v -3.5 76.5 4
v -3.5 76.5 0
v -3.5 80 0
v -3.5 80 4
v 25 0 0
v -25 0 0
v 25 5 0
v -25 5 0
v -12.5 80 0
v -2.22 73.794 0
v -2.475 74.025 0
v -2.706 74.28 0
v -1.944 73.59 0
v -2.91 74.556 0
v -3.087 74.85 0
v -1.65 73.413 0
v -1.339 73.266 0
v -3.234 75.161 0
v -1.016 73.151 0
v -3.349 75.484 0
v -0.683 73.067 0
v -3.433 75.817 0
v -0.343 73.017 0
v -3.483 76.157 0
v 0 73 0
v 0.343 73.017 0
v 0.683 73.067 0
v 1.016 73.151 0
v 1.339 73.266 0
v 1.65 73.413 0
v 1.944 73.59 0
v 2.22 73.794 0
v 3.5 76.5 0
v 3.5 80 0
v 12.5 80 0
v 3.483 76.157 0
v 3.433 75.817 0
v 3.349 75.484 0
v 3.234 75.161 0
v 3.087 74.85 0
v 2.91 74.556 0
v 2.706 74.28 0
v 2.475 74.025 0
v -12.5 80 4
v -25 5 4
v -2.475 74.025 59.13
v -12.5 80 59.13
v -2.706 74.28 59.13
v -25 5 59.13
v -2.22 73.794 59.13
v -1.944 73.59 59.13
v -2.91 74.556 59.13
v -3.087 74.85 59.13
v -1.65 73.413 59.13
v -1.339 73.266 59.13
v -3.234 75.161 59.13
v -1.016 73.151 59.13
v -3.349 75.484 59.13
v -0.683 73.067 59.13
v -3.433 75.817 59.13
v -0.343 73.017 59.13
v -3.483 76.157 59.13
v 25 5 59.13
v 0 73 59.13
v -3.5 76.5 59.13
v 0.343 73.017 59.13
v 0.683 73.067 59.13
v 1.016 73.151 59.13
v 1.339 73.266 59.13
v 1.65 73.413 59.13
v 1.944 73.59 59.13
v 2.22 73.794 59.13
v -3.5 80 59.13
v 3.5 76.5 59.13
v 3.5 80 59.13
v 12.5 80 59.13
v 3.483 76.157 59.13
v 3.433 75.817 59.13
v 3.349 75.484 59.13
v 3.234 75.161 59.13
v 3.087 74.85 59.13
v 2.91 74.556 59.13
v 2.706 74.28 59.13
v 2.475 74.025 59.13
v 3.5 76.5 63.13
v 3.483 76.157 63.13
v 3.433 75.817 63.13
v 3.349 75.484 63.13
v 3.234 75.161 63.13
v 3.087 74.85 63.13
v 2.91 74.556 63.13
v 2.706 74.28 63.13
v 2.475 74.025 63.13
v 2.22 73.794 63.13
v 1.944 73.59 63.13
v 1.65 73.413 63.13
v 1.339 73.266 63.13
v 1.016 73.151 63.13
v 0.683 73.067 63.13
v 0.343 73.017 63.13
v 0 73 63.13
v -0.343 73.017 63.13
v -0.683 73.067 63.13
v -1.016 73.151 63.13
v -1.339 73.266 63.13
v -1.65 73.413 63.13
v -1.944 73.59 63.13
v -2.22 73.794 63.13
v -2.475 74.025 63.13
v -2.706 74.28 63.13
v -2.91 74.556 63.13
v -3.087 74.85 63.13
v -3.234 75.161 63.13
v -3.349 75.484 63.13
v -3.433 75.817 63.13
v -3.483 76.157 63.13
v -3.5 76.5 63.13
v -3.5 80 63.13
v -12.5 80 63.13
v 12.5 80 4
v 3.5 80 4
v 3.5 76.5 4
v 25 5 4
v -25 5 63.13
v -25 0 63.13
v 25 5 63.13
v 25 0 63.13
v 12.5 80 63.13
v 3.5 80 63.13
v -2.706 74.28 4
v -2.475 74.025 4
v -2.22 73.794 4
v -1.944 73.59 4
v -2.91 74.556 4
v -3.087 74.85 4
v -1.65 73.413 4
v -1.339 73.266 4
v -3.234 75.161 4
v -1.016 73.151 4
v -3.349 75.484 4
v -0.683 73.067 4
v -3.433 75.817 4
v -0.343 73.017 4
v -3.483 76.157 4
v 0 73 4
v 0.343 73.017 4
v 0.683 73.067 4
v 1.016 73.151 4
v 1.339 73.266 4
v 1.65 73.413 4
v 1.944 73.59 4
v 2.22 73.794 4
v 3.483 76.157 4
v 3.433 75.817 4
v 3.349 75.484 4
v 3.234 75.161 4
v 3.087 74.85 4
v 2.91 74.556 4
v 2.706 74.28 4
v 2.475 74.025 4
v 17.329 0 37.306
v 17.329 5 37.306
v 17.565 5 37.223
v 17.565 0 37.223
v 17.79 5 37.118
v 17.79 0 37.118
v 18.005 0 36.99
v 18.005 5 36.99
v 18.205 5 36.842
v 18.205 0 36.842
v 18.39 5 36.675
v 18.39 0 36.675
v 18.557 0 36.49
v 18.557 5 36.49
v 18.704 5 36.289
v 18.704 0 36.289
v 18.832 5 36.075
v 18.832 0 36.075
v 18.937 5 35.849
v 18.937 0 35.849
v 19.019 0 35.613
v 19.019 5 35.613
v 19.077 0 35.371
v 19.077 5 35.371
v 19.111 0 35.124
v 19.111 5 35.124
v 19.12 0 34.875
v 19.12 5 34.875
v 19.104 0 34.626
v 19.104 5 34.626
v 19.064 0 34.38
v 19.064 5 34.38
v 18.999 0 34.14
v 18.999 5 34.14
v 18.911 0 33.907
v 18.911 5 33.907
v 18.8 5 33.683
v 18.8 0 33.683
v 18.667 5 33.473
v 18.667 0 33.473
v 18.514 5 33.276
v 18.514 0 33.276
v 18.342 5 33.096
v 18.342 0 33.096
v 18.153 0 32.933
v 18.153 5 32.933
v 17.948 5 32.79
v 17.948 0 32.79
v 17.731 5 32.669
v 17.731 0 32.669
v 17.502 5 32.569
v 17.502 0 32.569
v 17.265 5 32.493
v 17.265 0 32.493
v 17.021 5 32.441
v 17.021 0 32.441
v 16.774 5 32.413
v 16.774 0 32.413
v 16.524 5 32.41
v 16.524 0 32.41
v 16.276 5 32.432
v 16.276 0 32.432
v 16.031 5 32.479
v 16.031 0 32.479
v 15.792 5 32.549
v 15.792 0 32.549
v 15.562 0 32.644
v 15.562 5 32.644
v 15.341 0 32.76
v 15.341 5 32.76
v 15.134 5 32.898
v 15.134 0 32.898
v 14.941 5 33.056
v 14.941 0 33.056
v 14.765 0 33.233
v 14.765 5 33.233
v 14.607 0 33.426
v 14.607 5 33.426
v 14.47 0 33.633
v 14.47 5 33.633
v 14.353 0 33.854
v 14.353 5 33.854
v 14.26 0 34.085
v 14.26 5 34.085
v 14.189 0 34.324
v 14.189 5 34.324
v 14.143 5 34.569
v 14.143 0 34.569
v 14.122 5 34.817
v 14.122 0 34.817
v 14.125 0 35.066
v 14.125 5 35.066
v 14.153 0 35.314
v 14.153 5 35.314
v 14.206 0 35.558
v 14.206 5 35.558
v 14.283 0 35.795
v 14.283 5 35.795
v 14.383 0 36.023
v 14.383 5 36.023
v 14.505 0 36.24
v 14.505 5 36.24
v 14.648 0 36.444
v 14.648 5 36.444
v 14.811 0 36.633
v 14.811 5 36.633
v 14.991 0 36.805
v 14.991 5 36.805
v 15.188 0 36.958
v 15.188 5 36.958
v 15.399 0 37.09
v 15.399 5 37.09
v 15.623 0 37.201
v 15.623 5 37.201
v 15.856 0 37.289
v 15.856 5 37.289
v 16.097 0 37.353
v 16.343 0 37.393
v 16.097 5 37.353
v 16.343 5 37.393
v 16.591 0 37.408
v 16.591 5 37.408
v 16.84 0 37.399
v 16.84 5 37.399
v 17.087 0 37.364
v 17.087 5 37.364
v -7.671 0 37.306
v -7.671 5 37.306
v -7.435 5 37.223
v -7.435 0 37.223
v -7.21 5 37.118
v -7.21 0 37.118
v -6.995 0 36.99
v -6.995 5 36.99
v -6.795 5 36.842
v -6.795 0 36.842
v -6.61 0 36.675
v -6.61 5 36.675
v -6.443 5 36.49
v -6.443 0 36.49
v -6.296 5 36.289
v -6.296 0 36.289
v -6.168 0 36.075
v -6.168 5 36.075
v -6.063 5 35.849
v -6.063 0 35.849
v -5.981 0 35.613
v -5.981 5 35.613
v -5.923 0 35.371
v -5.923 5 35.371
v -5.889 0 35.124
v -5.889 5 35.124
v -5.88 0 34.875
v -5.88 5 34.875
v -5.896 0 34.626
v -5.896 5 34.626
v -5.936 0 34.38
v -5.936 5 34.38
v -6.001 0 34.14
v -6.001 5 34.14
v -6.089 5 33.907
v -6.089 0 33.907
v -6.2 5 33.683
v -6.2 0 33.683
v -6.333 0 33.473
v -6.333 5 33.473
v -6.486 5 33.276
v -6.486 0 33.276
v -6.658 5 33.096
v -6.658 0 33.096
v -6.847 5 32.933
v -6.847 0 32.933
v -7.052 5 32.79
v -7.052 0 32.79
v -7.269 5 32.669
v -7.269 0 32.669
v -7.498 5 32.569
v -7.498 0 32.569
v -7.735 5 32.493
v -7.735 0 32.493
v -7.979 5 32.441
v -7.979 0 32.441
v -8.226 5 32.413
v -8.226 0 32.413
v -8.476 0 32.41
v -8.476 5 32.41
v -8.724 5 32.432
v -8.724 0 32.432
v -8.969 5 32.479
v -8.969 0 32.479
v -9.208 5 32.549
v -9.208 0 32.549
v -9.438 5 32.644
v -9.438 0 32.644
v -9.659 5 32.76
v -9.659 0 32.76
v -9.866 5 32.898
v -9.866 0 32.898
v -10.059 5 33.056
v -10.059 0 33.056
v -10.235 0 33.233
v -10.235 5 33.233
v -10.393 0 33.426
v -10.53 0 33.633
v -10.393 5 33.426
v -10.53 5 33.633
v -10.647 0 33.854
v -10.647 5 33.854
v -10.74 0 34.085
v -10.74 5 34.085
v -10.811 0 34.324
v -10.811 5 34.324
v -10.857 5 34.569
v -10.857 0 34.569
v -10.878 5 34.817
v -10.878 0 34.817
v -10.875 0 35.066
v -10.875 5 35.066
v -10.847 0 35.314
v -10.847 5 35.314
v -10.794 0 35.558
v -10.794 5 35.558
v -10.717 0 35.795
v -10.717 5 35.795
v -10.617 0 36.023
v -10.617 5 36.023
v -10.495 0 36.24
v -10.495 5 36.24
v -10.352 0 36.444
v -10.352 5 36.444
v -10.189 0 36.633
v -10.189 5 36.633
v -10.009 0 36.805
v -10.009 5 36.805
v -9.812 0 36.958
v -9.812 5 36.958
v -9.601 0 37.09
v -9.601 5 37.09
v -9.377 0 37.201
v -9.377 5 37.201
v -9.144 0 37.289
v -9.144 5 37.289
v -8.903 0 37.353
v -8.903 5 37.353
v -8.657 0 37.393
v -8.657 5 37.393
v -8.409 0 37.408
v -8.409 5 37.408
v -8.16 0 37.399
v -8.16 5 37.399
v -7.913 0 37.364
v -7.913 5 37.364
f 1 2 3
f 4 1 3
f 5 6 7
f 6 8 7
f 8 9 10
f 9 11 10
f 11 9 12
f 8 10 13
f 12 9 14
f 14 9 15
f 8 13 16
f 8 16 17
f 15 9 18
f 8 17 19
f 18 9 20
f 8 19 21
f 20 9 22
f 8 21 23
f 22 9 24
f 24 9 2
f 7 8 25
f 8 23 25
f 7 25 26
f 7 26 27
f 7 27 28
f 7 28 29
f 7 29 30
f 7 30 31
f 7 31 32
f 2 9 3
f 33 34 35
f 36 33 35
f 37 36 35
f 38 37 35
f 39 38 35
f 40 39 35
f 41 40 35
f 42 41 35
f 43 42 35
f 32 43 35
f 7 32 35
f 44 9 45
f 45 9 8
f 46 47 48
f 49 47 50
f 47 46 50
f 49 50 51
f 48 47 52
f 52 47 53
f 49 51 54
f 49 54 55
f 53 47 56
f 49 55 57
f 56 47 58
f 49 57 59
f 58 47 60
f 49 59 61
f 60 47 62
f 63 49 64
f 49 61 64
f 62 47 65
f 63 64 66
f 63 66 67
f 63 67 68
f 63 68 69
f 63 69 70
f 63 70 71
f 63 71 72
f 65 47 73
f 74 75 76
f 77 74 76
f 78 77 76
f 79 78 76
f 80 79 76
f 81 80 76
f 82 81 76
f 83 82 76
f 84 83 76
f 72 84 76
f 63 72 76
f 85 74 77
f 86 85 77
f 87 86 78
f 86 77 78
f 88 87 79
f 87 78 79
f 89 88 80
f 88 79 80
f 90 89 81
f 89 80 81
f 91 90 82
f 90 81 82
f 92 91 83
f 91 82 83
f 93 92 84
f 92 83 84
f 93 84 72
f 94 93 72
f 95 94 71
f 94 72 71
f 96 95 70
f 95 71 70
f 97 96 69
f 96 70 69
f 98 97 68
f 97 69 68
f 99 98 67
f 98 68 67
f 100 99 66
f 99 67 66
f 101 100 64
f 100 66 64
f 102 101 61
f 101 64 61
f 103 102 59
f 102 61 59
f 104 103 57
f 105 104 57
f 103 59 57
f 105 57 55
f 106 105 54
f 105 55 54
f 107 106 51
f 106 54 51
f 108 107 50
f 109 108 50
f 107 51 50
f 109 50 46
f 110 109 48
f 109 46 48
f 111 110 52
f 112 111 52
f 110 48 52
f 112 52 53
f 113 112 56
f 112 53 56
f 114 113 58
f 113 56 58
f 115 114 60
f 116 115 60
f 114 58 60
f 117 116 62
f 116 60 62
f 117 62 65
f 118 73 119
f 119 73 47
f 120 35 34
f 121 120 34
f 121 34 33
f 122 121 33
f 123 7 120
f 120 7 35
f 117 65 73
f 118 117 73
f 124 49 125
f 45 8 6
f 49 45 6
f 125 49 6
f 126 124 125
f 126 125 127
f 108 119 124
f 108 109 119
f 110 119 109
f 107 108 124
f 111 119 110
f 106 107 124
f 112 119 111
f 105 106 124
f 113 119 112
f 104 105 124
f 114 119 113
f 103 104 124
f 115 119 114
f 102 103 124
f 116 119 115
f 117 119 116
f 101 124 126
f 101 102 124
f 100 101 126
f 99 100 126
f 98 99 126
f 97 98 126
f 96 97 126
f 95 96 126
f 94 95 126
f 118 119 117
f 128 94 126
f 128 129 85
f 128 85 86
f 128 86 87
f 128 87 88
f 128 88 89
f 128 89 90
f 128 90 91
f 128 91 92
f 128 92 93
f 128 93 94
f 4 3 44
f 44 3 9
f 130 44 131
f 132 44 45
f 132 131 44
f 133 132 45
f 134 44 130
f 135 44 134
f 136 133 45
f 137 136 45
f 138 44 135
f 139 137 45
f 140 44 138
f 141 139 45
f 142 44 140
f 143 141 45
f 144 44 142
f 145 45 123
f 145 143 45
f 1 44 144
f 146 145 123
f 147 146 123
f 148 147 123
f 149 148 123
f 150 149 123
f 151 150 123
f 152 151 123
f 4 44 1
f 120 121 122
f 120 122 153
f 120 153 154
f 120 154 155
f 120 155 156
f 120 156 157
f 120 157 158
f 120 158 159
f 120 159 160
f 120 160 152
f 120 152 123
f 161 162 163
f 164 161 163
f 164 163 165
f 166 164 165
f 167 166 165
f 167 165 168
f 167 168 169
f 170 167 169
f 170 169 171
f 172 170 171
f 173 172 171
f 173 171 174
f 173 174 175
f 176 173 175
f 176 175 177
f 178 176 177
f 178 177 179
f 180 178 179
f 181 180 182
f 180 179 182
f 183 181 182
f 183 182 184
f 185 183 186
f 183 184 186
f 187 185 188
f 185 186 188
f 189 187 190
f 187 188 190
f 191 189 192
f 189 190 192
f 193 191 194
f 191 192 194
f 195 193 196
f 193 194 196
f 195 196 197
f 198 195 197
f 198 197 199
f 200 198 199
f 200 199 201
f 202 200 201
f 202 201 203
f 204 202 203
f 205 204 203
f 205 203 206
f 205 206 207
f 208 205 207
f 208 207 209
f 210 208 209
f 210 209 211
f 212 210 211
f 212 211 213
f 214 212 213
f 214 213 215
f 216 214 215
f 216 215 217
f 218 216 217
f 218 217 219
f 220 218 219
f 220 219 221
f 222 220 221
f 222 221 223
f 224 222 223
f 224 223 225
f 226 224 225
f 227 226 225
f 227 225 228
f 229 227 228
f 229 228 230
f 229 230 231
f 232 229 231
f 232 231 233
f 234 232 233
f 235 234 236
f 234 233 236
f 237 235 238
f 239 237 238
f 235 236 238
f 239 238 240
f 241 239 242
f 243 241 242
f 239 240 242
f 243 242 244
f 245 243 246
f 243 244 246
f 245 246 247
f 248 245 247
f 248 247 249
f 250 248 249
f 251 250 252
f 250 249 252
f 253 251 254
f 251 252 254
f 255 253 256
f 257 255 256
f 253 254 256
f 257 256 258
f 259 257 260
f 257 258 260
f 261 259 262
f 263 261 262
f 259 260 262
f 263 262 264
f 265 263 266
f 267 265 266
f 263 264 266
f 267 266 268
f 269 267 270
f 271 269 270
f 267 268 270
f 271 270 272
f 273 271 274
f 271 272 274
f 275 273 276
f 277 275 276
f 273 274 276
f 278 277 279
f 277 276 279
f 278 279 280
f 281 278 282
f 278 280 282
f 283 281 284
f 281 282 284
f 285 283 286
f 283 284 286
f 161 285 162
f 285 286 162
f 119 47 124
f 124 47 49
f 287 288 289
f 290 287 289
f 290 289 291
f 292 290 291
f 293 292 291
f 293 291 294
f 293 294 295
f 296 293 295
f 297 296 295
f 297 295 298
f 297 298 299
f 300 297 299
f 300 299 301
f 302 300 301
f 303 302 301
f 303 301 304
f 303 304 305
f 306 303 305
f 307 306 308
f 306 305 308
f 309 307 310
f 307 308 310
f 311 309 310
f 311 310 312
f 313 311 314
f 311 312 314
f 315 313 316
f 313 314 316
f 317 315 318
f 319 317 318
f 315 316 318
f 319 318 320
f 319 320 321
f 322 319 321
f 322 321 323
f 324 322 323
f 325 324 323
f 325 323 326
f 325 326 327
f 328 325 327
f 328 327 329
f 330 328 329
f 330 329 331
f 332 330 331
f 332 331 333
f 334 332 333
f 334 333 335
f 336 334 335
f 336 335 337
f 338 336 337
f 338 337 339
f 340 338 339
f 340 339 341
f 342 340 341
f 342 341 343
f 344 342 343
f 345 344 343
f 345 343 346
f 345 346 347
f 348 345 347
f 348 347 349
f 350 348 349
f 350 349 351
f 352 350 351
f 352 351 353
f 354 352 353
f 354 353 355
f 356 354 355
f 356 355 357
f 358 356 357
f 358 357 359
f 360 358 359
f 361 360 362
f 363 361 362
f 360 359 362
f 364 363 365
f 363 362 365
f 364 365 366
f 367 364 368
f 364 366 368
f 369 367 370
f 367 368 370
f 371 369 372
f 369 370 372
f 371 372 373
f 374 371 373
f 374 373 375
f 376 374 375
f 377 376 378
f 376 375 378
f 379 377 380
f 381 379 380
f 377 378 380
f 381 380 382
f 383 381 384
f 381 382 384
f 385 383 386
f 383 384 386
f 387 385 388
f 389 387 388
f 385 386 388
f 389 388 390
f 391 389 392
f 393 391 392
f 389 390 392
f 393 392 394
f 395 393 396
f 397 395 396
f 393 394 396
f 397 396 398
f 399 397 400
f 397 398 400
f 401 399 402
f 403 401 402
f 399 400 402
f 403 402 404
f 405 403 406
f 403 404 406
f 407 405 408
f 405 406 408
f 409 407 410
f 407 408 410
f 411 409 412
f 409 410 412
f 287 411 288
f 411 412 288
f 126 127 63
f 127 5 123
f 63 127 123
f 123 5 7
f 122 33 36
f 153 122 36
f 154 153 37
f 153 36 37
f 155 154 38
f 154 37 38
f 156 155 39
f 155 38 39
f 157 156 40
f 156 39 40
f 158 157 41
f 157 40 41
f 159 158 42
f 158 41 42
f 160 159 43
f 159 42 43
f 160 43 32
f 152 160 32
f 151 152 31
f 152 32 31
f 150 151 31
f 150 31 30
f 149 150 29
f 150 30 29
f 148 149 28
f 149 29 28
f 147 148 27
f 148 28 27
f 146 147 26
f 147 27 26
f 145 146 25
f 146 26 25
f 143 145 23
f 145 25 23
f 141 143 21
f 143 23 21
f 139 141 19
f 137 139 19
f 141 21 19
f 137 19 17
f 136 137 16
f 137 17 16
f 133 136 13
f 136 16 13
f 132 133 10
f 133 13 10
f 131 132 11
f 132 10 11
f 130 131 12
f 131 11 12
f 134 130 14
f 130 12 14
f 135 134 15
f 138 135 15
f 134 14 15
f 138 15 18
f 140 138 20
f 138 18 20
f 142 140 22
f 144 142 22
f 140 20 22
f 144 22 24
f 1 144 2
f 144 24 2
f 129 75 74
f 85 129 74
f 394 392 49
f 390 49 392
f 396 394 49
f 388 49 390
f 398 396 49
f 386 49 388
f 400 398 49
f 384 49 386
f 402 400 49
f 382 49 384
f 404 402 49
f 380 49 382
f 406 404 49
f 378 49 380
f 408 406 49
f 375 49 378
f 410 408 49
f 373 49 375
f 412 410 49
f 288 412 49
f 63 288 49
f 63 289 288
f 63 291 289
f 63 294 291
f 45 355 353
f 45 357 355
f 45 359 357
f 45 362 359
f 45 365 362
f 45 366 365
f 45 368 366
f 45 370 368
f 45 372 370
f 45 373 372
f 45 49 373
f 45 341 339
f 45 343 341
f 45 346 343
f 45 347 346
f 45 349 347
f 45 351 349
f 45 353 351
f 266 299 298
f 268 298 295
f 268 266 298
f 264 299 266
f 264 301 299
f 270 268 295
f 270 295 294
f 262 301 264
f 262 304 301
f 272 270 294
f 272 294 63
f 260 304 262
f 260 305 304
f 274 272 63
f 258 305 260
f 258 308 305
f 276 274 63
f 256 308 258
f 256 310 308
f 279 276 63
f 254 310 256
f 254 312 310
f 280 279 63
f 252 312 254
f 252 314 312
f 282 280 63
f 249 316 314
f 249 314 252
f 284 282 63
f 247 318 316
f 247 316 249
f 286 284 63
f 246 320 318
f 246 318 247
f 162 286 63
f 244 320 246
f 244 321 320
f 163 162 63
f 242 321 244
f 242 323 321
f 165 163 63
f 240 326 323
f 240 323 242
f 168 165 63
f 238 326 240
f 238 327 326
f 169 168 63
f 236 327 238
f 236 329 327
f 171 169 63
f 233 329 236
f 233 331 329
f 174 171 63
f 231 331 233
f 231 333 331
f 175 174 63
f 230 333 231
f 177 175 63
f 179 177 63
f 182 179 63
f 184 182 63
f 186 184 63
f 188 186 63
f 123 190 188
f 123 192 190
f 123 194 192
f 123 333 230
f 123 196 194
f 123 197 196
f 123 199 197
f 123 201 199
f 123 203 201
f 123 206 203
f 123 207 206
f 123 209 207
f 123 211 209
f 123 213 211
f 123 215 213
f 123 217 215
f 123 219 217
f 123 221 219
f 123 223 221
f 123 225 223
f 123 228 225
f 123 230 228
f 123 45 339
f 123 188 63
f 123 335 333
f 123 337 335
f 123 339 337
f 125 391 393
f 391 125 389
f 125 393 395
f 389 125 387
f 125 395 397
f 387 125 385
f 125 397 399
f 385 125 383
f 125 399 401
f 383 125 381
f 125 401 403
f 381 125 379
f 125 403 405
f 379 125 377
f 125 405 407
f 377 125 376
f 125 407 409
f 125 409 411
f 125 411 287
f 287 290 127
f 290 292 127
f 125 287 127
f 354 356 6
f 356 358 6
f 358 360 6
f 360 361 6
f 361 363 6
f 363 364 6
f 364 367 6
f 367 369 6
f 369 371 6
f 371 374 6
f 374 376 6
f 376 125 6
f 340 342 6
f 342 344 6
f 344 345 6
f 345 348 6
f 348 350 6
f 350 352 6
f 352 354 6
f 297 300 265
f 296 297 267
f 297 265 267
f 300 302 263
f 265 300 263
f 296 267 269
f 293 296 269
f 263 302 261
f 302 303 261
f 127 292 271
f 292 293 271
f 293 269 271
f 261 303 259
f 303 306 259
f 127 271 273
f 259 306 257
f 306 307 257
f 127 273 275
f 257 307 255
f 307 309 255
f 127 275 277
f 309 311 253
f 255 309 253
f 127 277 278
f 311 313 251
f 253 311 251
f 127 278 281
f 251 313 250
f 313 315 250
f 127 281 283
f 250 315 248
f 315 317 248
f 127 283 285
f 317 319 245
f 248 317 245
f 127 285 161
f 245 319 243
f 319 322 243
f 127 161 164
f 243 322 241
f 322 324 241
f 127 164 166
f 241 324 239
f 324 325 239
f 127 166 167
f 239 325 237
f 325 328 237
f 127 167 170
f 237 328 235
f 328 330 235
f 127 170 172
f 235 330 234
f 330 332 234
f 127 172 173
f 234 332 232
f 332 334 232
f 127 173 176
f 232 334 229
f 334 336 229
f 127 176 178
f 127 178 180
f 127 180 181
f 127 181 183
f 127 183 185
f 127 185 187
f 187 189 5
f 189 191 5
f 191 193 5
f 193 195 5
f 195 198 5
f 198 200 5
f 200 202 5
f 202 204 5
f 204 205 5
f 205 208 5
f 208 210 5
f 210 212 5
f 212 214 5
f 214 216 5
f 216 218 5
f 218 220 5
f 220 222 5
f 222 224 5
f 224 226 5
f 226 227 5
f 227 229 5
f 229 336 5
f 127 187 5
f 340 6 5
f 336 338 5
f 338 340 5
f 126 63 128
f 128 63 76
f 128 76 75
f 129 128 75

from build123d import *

# Parameters (mm, degrees)
ESTRUSIONE_ESTRUSIONE1_DEPTH = 4
SCHIZZO2_W                   = 50
SCHIZZO2_H                   = 5
ESTRUSIONE_ESTRUSIONE2_DEPTH = 55.13
ESTRUSIONE_ESTRUSIONE3_DEPTH = 4
FORO_PER_VITE_M5_1_D         = 5


with BuildPart() as part:
    # Schizzo1 → Estrusione-Estrusione1 (new body)
    with BuildSketch(Plane.XY):
        with BuildLine():
            Line((-25, 0), (25, 0))
            Line((25, 0), (25, 5))
            Line((25, 5), (12.5, 80))
            Line((12.5, 80), (3.5, 80))
            Line((3.5, 80), (3.5, 76.5))
            ThreePointArc((3.5, 76.5), (0, 73), (-3.5, 76.5))
            Line((-3.5, 76.5), (-3.5, 80))
            Line((-3.5, 80), (-12.5, 80))
            Line((-12.5, 80), (-25, 5))
            Line((-25, 5), (-25, 0))
        make_face()
    extrude(amount=ESTRUSIONE_ESTRUSIONE1_DEPTH)

    # Schizzo2 → Estrusione-Estrusione2 (add)
    with BuildSketch(Plane.XY.offset(4)):
        with Locations((0, 2.5)):
            Rectangle(SCHIZZO2_W, SCHIZZO2_H)
    extrude(amount=ESTRUSIONE_ESTRUSIONE2_DEPTH)

    # Schizzo3 → Estrusione-Estrusione3 (add)
    with BuildSketch(Plane.XY.offset(59.13)):
        with BuildLine():
            Line((3.5, 80), (3.5, 76.5))
            ThreePointArc((3.5, 76.5), (0, 73), (-3.5, 76.5))
            Line((-3.5, 76.5), (-3.5, 80))
            Line((-3.5, 80), (-12.5, 80))
            Line((-12.5, 80), (-25, 5))
            Line((-25, 5), (-25, 0))
            Line((-25, 0), (25, 0))
            Line((25, 0), (25, 5))
            Line((25, 5), (12.5, 80))
            Line((12.5, 80), (3.5, 80))
        make_face()
    extrude(amount=ESTRUSIONE_ESTRUSIONE3_DEPTH)

    # Foro per Vite M5-1 (through all)
    with Locations(Plane(origin=(658.388856913, -5, 71.018331699), x_dir=(-0.2836975166298168, 0, -0.9589138225398959), z_dir=(0, -1, 0))):
        with Locations((223.786948804, -629.129350035), (216.694510888, -605.156504471)):
            Hole(FORO_PER_VITE_M5_1_D / 2)


solid = part.part
